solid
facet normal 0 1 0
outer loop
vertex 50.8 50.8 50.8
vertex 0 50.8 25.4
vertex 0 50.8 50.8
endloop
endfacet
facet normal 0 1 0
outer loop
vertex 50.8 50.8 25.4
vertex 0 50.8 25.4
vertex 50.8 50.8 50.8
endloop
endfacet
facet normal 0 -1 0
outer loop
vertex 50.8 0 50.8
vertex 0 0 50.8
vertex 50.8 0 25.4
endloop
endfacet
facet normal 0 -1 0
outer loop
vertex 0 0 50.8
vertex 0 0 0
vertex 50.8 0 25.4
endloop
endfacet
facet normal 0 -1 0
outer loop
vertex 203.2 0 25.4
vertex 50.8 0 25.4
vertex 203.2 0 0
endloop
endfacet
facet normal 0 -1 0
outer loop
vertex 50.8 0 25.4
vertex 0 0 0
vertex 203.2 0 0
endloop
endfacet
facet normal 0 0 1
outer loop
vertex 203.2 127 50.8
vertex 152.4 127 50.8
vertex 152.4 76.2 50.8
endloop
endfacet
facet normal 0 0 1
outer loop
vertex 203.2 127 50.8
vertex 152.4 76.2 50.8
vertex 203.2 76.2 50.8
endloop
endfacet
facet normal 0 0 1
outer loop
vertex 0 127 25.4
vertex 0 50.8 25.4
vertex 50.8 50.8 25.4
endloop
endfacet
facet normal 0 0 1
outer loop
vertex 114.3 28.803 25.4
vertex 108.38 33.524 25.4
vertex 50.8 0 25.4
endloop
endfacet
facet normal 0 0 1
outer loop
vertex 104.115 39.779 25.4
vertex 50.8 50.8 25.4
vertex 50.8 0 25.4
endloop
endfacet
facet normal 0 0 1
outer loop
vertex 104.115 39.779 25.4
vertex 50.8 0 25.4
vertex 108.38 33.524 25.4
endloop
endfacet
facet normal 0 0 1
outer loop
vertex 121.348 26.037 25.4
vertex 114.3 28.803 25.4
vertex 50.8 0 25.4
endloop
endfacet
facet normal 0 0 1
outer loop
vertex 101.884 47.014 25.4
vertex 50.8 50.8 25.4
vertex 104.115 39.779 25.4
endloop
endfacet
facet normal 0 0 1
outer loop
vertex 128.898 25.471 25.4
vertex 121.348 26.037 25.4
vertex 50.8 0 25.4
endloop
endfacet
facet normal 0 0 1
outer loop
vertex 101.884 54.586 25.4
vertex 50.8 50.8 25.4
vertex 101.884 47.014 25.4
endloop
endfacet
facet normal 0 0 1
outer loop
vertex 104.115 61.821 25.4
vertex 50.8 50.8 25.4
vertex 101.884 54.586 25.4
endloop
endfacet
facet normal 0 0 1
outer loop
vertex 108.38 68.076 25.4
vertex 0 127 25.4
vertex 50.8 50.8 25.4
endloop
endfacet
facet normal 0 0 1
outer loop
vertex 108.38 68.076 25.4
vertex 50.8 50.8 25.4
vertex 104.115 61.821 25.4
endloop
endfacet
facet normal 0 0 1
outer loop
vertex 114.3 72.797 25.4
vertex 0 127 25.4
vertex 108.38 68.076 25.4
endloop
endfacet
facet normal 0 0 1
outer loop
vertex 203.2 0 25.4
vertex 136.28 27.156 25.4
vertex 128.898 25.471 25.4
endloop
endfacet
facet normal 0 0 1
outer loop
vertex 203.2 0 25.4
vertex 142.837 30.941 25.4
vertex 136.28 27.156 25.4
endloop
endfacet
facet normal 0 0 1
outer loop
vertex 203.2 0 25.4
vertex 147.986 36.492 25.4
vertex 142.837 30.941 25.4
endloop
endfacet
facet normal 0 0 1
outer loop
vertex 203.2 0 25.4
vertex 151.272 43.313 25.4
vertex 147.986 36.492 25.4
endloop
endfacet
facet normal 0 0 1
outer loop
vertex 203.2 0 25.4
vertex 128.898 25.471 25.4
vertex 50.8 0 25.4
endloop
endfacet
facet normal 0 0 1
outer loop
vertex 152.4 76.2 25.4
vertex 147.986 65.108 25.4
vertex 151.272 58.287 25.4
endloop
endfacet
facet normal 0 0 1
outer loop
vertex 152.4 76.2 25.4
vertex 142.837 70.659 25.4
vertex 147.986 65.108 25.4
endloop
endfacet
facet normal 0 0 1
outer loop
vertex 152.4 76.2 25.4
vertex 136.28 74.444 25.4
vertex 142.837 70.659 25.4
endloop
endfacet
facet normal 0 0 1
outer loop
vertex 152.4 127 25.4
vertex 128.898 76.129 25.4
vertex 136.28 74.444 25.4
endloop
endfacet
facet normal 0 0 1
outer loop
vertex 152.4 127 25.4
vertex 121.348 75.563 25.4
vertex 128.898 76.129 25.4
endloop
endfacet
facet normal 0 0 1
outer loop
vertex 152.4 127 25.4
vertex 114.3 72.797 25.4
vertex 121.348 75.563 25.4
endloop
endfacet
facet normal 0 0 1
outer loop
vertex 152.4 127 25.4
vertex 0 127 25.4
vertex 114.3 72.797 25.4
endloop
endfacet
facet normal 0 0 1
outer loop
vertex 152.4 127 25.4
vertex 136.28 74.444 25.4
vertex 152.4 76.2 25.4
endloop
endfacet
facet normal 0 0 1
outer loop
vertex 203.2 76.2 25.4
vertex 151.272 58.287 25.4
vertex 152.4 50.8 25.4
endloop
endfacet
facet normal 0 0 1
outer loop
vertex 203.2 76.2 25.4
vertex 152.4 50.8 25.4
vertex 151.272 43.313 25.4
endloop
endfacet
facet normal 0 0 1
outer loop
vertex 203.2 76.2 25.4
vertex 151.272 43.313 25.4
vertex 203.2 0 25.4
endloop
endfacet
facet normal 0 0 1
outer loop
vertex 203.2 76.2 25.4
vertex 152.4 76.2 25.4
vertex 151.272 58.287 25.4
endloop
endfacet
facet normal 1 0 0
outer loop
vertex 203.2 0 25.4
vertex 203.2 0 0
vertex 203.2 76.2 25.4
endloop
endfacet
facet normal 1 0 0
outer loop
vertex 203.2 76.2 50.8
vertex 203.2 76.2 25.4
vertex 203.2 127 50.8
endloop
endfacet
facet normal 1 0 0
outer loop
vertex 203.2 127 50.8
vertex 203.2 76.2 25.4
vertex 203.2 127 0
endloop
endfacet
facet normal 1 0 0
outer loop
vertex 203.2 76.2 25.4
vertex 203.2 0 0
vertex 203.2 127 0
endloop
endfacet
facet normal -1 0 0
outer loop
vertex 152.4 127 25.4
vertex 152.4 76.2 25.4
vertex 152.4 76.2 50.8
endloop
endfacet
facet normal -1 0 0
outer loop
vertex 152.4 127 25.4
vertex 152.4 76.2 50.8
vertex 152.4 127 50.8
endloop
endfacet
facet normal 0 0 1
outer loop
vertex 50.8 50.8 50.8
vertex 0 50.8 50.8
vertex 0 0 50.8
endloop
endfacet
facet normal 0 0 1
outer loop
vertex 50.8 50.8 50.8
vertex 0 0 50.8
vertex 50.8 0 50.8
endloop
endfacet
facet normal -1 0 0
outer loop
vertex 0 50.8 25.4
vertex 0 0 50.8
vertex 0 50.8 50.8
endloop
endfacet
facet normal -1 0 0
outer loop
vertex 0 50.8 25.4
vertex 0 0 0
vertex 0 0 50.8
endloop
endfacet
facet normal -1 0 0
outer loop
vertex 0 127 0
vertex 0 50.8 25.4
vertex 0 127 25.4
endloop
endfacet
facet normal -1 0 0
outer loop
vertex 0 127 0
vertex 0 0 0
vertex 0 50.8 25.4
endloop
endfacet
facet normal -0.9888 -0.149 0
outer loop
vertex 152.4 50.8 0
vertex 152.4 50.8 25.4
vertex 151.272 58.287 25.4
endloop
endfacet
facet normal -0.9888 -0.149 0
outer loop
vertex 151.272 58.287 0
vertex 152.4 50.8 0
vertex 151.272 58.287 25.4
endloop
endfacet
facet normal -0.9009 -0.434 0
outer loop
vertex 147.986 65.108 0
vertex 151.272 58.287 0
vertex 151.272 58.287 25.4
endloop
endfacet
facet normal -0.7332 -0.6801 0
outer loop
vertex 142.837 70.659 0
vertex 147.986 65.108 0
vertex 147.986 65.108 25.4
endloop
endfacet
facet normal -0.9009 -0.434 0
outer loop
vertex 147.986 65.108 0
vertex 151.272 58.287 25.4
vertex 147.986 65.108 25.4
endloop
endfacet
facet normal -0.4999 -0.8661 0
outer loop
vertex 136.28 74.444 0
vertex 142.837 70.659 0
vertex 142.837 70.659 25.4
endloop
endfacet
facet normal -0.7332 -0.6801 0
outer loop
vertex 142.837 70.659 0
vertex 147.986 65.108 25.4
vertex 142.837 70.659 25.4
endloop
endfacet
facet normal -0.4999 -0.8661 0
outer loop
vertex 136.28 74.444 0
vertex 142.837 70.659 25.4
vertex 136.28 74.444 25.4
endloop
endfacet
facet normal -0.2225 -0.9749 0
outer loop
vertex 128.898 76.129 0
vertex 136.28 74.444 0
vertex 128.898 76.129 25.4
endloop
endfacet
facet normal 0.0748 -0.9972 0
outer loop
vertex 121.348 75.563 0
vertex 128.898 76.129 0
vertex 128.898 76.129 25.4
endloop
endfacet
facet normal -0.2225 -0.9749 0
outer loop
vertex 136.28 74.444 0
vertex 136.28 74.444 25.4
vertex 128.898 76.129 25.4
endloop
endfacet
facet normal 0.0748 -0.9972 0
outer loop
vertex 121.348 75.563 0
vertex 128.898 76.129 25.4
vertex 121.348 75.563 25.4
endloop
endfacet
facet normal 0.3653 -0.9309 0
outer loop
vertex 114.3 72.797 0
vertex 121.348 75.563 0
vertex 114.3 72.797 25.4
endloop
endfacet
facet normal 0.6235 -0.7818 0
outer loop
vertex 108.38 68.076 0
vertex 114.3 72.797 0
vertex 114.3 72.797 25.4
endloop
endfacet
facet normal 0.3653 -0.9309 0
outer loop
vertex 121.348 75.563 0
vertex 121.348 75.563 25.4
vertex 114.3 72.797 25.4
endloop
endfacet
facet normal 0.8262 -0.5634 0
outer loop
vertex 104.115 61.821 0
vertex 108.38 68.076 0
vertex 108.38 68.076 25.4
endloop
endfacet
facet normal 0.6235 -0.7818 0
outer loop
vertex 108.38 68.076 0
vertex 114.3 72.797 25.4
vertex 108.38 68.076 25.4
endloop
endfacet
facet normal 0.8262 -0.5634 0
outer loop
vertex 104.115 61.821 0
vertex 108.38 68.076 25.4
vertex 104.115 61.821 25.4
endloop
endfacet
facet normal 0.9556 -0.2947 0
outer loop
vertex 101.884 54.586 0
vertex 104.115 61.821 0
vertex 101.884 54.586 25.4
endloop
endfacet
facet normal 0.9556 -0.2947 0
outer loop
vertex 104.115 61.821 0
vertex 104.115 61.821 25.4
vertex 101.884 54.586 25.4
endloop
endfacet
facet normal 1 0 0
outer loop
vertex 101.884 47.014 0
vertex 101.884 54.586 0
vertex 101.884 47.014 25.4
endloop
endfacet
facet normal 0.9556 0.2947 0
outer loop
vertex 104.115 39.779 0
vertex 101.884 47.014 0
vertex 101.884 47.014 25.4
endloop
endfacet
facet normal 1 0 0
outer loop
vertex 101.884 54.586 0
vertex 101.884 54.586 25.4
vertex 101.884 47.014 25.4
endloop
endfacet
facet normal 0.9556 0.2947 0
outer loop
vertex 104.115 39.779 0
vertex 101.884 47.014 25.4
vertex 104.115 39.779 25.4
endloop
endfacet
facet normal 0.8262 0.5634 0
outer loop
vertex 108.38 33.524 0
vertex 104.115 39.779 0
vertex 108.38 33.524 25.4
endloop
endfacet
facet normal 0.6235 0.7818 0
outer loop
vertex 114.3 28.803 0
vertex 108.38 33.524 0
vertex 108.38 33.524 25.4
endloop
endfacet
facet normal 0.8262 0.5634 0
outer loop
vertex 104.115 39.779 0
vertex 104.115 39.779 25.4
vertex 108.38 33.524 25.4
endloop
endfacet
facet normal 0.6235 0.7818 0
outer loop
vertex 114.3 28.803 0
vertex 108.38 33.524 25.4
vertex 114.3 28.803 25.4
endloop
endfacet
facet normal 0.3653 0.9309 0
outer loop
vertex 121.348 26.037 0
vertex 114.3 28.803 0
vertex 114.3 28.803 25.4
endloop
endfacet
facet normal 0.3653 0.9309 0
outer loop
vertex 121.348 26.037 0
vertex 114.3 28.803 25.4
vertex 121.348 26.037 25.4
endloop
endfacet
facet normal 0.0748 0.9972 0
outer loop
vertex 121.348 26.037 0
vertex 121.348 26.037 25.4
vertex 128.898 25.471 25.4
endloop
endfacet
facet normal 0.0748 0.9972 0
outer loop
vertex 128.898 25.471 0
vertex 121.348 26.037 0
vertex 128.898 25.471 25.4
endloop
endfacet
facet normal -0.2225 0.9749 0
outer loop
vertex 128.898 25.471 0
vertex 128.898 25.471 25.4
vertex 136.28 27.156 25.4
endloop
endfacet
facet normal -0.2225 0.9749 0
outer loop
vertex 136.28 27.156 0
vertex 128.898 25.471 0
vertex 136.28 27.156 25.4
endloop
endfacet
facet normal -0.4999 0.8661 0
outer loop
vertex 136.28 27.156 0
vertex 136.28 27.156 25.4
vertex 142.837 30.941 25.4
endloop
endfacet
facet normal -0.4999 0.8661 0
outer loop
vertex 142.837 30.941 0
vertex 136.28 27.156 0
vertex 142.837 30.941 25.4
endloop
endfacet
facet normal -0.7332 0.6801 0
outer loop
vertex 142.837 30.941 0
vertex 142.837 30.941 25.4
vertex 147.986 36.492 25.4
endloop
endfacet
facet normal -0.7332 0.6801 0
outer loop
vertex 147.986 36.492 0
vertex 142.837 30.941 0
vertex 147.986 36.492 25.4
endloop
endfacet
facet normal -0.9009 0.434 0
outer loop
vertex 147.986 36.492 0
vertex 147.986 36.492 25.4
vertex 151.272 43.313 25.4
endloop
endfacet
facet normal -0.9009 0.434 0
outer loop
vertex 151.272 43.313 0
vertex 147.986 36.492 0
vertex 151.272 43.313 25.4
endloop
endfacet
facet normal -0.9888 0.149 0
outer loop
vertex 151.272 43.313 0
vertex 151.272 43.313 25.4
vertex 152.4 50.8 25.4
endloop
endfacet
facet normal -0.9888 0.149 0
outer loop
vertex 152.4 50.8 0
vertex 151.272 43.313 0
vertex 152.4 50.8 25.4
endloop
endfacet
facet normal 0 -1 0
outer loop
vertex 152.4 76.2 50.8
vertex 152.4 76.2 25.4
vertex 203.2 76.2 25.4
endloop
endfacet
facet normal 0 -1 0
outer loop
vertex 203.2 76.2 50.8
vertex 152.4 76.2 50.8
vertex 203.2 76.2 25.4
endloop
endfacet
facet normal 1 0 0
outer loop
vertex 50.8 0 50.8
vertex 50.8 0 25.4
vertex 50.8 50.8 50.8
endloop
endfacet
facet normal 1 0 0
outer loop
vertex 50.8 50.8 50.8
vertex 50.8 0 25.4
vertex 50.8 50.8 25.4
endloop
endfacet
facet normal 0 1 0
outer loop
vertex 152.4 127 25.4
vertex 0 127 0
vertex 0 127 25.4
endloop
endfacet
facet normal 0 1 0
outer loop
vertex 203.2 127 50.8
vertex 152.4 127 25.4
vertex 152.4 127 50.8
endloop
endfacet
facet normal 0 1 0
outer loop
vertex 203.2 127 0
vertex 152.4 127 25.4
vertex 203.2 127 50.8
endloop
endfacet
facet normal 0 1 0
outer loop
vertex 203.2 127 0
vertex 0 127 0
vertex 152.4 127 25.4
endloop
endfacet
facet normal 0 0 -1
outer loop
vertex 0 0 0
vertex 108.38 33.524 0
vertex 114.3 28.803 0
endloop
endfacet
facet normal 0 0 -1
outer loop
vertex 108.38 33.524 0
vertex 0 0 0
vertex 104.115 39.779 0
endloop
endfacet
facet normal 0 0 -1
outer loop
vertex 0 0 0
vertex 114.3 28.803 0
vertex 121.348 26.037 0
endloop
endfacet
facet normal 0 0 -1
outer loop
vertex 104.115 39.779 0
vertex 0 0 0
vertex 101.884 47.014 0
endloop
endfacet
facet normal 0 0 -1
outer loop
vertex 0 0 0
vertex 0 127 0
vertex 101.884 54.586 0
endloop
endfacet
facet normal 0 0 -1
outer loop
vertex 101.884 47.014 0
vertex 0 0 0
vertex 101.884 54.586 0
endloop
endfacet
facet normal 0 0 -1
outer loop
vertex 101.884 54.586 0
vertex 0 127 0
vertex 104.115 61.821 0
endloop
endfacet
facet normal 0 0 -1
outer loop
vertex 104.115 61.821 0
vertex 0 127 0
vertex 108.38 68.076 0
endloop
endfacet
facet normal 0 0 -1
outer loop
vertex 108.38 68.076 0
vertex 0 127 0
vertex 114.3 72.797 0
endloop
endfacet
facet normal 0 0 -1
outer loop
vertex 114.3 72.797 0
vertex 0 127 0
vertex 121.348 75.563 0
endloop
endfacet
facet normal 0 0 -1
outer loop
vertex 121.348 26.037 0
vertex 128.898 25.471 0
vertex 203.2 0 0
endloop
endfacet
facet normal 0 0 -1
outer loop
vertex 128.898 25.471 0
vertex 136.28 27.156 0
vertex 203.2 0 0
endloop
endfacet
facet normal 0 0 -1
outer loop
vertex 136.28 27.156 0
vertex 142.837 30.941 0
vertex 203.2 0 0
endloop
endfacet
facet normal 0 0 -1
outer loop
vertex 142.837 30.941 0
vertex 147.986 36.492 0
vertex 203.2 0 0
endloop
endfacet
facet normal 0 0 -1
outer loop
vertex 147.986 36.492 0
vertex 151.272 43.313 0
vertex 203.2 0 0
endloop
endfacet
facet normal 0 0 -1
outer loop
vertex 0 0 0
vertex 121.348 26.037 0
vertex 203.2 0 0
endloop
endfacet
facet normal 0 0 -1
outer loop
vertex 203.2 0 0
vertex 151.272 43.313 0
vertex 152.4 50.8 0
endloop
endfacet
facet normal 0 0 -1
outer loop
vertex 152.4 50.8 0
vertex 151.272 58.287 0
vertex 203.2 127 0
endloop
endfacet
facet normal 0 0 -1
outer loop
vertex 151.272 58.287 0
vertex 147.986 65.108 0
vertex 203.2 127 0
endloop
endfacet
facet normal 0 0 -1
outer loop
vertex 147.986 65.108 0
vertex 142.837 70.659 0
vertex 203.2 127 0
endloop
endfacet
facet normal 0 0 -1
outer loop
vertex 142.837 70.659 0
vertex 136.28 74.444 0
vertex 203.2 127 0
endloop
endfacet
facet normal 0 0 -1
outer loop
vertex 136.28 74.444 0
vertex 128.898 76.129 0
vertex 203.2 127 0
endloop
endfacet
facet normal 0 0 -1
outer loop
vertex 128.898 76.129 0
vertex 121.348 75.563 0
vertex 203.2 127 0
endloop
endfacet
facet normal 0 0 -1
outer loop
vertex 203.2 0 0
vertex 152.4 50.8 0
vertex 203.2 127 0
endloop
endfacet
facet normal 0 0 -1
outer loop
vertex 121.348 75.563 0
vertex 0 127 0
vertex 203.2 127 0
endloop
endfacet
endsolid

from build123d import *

# Parameters (mm, degrees)
F0_W     = 203.2
F0_H     = 127
F1_DEPTH = 25.4
F2_W     = 50.8
F2_H     = 50.8
F3_DEPTH = 25.4
F4_R     = 25.4
F5_DEPTH = 25.401


with BuildPart() as f1:
    # F0 (on Top) → F1 (new body)
    with BuildSketch(Plane.XY):
        with Locations((101.6, 63.5)):
            Rectangle(F0_W, F0_H)
    extrude(amount=F1_DEPTH)

    # F2 (on face) → F3 (join)
    with BuildSketch(Plane.XY.offset(25.4)):
        with Locations((25.4, 25.4)):
            Rectangle(F2_W, F2_H)
        with Locations((177.8, 101.6)):
            Rectangle(F2_W, F2_H)
    extrude(amount=F3_DEPTH)

    # F4 (on face) → F5 (cut, through all)
    with BuildSketch(Plane.XY.offset(25.4)):
        with Locations((127, 50.8)):
            Circle(F4_R)
    extrude(amount=-F5_DEPTH, mode=Mode.SUBTRACT)


solid = f1.part
